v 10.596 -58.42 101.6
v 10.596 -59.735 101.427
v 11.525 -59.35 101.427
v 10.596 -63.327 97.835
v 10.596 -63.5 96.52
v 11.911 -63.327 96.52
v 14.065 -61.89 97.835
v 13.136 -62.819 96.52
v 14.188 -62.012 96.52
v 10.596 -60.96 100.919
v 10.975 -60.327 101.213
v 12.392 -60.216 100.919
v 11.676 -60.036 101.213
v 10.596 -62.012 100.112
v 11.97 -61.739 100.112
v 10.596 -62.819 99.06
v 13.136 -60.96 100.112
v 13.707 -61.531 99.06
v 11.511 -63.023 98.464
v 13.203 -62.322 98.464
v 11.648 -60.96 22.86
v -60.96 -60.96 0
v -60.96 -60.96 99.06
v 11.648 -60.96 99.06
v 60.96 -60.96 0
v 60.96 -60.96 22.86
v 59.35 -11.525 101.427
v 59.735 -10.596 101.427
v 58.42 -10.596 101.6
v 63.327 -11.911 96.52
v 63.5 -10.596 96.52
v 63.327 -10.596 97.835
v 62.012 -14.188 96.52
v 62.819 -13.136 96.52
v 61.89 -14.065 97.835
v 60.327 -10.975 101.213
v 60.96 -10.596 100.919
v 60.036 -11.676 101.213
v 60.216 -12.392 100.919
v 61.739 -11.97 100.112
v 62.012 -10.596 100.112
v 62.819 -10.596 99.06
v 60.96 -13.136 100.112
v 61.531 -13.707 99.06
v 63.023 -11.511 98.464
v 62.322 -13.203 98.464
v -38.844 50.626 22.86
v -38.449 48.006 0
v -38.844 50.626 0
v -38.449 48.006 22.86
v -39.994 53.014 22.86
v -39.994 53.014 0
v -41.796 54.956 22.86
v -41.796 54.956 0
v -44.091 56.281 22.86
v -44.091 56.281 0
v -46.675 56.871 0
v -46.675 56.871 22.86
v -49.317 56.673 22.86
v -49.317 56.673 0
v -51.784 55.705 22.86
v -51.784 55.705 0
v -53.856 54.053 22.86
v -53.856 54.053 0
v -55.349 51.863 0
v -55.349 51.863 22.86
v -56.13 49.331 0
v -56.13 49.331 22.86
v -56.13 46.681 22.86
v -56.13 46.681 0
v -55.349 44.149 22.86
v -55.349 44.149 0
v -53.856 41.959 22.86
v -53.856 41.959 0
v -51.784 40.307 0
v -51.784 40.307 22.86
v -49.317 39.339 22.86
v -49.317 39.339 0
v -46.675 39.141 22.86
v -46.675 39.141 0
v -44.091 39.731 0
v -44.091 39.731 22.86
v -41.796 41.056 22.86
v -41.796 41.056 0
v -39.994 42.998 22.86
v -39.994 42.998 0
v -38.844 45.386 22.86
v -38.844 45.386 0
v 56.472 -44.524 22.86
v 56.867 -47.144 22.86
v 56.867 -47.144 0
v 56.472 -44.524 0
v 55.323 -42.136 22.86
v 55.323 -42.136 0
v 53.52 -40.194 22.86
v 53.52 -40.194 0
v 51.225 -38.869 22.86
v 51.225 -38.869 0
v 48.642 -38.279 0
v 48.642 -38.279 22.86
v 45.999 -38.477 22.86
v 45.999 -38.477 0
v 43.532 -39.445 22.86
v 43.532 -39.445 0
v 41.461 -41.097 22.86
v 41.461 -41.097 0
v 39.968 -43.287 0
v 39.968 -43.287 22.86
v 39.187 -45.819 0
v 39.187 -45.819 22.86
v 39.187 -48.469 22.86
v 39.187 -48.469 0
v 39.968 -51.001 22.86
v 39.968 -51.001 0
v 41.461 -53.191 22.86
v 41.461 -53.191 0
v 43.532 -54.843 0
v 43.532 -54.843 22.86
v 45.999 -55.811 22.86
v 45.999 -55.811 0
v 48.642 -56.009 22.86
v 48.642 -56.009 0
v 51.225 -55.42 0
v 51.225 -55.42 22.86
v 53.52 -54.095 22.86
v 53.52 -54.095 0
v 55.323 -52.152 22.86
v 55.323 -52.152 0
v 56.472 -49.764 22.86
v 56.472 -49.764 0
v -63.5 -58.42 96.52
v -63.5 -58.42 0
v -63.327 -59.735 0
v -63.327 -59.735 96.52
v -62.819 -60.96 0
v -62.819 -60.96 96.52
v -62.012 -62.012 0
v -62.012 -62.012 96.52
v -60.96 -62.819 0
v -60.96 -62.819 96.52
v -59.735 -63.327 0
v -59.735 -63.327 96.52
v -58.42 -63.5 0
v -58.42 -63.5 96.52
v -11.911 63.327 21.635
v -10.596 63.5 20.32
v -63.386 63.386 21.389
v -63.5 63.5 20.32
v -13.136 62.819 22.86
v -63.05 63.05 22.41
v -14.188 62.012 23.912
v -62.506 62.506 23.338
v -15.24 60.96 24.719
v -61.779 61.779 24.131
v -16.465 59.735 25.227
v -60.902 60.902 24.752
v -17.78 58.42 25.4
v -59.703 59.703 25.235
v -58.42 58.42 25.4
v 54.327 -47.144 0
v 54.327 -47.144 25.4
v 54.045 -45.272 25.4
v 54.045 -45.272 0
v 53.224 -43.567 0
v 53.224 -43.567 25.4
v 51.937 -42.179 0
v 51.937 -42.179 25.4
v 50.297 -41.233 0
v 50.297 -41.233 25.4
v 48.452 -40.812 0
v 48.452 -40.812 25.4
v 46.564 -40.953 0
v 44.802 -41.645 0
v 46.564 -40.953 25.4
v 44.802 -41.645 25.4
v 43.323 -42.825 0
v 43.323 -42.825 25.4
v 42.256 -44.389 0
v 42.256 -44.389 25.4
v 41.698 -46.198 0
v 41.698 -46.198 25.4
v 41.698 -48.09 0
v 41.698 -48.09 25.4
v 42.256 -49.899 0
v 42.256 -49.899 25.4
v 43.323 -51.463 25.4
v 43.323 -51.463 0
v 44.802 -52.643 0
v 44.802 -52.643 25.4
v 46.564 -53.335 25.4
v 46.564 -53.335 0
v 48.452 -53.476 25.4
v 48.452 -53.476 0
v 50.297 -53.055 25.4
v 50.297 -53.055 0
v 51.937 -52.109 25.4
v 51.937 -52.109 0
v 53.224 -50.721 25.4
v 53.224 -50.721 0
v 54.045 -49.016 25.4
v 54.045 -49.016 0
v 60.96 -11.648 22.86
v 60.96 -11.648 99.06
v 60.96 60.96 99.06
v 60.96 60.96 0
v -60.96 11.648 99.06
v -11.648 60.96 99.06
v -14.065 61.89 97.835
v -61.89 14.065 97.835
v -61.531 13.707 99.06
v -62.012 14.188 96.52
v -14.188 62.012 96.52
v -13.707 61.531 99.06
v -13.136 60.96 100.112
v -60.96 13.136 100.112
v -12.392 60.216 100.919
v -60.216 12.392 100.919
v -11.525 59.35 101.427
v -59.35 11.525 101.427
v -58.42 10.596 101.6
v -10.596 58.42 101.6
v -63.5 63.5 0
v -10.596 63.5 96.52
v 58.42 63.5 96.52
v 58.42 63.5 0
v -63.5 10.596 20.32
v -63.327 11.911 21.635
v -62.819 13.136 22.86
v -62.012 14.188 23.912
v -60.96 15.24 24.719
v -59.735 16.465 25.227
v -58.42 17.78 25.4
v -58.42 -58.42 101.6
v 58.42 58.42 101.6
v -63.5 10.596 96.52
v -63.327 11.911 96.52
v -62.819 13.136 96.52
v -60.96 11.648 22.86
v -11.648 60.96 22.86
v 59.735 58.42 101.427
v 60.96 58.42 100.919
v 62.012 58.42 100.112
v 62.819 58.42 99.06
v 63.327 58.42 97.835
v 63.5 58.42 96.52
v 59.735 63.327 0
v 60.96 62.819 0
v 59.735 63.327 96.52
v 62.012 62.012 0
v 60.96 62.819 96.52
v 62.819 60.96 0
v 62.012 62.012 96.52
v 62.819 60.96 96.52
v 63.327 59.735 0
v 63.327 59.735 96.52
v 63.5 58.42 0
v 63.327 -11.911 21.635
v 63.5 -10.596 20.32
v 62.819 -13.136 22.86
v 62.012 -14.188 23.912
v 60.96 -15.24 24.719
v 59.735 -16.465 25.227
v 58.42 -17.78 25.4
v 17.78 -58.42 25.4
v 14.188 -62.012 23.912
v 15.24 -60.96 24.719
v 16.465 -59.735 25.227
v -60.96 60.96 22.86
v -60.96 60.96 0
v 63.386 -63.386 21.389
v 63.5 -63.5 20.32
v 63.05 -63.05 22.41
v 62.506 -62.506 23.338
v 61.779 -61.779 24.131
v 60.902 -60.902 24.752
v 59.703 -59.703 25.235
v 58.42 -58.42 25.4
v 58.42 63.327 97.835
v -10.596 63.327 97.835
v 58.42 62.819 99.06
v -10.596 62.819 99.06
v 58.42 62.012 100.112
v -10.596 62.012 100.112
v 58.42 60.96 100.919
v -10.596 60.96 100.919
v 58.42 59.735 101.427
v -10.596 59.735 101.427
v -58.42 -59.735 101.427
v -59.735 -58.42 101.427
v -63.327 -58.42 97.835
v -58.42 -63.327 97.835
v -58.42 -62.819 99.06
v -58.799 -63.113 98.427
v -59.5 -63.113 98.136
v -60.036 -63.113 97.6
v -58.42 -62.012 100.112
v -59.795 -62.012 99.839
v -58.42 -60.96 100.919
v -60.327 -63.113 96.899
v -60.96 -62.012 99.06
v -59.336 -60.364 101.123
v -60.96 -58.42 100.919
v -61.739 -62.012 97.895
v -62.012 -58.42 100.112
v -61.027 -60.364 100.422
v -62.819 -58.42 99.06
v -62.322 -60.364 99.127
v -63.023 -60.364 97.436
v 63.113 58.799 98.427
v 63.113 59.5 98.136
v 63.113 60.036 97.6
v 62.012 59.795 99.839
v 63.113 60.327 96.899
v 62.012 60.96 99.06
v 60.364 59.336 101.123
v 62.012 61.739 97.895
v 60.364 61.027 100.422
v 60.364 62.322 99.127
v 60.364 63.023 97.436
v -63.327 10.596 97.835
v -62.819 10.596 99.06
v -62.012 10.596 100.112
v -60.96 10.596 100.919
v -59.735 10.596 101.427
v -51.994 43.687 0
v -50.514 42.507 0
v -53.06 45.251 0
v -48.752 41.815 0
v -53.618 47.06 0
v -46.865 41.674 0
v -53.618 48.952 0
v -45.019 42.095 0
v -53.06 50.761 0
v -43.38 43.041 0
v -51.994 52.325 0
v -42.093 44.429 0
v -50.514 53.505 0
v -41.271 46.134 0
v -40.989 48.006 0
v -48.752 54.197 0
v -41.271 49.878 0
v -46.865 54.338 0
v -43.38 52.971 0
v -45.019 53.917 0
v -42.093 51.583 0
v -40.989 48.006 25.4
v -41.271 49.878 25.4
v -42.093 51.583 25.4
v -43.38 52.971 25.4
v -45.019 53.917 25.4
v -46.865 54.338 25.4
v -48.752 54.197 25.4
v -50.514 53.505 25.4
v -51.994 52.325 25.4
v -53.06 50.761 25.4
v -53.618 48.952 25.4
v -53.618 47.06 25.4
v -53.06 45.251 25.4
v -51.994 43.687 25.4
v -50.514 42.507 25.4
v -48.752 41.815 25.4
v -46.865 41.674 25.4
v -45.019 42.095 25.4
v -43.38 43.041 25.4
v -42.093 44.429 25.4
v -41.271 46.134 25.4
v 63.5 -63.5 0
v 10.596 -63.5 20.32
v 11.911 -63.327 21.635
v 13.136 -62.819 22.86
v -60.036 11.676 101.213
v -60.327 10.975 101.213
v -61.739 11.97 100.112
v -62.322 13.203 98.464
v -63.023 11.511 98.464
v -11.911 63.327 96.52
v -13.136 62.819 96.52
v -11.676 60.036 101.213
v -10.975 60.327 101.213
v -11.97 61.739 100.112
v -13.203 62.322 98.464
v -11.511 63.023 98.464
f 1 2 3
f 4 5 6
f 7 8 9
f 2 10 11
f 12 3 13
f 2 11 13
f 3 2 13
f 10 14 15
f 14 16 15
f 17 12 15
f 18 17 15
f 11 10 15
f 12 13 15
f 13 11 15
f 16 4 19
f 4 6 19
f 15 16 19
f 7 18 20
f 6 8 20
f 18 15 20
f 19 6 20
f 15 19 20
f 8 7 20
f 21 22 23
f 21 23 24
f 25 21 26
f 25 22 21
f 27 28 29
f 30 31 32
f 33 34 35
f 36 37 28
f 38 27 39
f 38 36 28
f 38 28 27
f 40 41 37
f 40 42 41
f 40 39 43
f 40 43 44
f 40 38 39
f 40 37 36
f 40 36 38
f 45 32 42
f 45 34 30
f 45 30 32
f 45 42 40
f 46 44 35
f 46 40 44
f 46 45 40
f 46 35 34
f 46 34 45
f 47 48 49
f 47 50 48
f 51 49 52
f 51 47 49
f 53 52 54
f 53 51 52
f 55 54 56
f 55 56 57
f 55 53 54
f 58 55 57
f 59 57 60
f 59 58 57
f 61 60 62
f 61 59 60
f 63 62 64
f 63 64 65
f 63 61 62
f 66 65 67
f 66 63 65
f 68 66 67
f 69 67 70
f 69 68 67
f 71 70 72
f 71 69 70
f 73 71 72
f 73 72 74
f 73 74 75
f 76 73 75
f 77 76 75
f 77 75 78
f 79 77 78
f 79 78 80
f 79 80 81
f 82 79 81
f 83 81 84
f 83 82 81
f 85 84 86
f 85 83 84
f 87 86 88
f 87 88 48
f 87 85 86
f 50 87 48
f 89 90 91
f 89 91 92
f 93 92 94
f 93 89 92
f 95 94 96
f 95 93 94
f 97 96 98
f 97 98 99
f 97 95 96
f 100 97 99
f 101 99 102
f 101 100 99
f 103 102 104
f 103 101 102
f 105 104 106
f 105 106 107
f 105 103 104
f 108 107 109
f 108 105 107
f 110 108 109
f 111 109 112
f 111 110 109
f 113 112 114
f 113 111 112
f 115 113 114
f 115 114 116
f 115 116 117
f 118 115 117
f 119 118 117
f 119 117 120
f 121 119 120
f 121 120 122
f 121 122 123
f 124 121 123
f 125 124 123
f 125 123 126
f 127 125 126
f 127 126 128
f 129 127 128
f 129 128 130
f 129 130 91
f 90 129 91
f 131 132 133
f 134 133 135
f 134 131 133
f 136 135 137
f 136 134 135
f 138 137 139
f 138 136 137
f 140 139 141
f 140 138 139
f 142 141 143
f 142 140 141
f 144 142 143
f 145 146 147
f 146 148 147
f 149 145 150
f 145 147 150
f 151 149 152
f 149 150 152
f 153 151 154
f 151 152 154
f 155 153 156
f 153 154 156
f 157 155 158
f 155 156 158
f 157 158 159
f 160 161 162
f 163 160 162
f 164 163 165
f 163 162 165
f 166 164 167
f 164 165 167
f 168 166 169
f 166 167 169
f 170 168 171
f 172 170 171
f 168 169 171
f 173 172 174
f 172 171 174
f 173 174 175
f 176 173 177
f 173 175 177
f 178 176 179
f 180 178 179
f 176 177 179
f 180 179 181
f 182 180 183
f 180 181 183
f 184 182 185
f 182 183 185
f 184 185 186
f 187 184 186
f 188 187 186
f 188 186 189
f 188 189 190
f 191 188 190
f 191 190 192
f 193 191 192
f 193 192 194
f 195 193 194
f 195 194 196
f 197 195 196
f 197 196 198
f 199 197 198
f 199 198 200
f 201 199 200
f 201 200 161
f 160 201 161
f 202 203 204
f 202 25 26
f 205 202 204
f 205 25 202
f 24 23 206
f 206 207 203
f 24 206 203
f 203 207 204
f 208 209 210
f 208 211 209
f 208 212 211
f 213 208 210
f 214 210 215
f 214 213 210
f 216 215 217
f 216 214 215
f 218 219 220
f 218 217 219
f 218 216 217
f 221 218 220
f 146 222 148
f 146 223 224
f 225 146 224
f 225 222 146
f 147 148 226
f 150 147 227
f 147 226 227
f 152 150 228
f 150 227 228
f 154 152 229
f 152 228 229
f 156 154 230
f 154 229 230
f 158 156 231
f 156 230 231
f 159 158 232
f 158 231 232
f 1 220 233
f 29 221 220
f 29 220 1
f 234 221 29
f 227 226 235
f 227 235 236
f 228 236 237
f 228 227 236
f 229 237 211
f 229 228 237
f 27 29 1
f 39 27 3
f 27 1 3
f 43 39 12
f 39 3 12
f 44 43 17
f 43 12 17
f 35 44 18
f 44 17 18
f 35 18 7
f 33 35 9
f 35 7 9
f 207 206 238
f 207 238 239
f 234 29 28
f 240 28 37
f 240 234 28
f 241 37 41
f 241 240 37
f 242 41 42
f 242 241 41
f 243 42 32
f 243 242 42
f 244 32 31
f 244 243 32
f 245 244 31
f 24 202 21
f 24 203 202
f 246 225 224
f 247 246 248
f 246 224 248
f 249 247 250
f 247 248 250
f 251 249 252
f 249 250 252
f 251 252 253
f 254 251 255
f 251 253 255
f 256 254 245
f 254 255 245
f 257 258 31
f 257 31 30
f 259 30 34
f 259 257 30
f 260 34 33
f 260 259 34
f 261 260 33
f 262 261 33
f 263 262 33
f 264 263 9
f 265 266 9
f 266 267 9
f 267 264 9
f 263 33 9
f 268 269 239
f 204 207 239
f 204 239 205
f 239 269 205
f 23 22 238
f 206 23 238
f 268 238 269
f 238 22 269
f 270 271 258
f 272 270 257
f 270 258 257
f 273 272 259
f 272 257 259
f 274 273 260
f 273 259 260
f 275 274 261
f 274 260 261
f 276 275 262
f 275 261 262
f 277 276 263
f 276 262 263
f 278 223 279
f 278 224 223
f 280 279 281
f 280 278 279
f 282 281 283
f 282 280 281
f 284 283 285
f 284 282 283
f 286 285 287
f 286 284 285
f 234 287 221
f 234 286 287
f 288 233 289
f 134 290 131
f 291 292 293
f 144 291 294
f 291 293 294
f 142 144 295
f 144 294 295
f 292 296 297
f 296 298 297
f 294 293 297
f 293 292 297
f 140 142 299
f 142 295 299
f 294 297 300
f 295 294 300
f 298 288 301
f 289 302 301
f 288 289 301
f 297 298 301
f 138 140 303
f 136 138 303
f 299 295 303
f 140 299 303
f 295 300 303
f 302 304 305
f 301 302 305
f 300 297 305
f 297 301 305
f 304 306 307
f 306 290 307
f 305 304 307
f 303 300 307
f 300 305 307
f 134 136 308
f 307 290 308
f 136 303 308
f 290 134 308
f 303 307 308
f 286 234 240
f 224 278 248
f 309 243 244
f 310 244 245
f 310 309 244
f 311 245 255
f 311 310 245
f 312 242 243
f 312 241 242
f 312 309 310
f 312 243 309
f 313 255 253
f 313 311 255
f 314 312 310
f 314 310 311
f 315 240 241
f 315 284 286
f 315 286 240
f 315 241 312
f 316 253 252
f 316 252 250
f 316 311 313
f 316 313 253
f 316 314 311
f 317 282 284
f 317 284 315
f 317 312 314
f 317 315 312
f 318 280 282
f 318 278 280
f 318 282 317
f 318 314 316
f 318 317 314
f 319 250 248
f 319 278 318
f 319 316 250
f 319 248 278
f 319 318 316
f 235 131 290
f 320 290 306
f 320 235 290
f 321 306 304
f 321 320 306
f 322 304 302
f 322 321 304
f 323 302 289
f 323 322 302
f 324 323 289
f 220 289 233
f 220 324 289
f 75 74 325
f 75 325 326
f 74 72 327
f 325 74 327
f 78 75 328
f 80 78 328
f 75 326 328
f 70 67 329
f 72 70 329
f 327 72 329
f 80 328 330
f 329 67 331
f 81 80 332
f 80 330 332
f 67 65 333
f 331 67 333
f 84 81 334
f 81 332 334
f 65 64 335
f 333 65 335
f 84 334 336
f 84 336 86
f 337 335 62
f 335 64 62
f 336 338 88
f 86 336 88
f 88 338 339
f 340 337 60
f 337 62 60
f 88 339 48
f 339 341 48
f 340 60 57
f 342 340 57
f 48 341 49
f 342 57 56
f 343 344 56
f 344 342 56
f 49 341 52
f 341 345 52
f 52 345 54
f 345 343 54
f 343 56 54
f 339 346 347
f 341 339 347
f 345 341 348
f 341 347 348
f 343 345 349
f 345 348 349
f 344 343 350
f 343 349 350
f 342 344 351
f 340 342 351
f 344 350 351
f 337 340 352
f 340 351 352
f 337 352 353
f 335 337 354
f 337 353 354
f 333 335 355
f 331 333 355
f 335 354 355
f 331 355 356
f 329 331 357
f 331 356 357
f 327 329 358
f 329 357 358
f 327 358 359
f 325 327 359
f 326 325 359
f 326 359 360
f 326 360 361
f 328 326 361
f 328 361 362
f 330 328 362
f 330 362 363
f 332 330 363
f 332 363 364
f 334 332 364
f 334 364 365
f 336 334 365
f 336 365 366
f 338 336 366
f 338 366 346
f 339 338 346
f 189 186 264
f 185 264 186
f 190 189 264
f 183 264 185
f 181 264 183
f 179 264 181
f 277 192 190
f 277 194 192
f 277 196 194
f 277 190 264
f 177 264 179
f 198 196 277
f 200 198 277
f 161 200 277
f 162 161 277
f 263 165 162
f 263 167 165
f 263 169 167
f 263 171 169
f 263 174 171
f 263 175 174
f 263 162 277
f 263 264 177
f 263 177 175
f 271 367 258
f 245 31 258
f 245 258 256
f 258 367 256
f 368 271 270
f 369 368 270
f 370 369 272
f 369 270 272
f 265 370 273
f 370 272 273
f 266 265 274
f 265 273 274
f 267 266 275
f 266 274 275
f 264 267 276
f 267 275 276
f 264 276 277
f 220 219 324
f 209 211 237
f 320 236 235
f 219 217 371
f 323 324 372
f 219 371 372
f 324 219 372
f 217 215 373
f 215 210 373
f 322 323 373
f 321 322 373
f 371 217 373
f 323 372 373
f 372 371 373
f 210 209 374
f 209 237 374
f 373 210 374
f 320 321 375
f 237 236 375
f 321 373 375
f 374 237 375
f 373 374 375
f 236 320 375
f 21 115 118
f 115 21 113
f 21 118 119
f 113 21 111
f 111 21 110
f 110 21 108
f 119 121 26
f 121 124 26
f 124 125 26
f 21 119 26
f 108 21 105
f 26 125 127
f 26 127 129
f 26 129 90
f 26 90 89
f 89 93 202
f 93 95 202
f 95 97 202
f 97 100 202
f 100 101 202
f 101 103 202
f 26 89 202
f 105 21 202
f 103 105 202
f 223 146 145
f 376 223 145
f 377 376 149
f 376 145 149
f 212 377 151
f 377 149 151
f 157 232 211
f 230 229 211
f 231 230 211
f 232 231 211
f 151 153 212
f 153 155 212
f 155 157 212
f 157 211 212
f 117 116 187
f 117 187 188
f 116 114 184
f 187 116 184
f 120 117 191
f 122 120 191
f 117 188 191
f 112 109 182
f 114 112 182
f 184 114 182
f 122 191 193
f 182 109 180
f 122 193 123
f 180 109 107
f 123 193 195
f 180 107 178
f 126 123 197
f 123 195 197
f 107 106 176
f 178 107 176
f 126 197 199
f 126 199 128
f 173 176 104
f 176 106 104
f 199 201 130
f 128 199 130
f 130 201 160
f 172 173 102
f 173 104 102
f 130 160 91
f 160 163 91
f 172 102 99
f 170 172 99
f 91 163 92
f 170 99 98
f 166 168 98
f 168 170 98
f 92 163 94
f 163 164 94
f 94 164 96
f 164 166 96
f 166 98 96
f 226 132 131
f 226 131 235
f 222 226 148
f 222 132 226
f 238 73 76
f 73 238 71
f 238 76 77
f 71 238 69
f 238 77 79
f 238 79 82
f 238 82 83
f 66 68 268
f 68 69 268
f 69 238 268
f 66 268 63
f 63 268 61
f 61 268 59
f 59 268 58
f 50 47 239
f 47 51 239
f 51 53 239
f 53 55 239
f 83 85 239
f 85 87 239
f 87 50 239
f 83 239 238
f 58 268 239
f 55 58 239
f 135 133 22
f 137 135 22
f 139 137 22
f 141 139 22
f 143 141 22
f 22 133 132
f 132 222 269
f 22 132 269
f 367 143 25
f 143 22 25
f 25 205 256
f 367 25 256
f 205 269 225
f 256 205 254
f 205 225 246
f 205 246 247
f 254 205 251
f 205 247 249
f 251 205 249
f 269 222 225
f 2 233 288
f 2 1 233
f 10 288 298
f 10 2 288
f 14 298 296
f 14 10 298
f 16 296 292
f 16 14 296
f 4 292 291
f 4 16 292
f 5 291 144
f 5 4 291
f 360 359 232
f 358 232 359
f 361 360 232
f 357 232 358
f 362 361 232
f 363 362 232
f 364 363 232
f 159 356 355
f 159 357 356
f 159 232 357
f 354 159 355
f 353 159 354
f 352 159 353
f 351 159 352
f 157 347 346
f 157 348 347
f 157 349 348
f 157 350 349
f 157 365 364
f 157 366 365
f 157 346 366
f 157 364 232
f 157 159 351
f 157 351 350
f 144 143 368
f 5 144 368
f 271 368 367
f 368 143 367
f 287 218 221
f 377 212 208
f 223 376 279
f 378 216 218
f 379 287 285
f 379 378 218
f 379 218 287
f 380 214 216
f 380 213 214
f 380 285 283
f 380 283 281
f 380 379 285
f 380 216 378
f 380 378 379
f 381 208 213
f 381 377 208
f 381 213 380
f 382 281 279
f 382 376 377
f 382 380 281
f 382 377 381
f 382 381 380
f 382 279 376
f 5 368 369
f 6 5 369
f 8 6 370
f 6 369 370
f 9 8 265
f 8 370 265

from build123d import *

# Parameters (mm, degrees)
F0_W     = 127
F0_H     = 127
F1_DEPTH = 101.6
F3_DEPTH = 76.2
F4_R     = 6.35
F5_DEPTH = 203.2
F6_T     = -2.54
F7_R     = 5.08


with BuildPart() as f1:
    # F0 (on Top) → F1 (new body)
    with BuildSketch(Plane.XY):
        Rectangle(F0_W, F0_H)
    extrude(amount=F1_DEPTH)

    # F2 (on face) → F3 (cut)
    with BuildSketch(Plane.XY.offset(101.6)):
        Polygon((63.5, -63.5), (63.5, -12.7), (12.7, -63.5), align=None)
        Polygon((-63.5, 12.7), (-12.7, 63.5), (-63.5, 63.5), align=None)
    extrude(amount=-F3_DEPTH, mode=Mode.SUBTRACT)

    # F4 (on face) → F5 (cut)
    with BuildSketch(Plane.XY.offset(25.4)):
        with Locations((-47.3392494023, 48.0060018599)):
            Circle(F4_R)
        with Locations((47.9774476191, -47.1440458012)):
            Circle(F4_R)
    extrude(amount=-F5_DEPTH, mode=Mode.SUBTRACT)

    # F6
    f6_openings = [f1.faces().sort_by_distance(p)[0] for p in [
        (-0.005092, -0.006878, 0),
    ]]
    offset(amount=F6_T, openings=f6_openings, kind=Kind.INTERSECTION)

    # F7
    f7_edges = [f1.edges().sort_by_distance(p)[0] for p in [
        (-38.1, 38.1, 101.6),
        (-63.5, -25.4, 101.6),
        (-63.5, 12.7, 63.5),
        (25.4, 63.5, 101.6),
        (63.5, 25.4, 101.6),
        (38.1, -38.1, 101.6),
        (63.5, -12.7, 63.5),
        (12.7, -63.5, 63.5),
        (-25.4, -63.5, 101.6),
        (63.5, -38.1, 25.4),
        (38.1, -63.5, 25.4),
        (63.5, 63.5, 50.8),
        (-12.7, 63.5, 63.5),
        (-38.1, 63.5, 25.4),
        (-63.5, 38.1, 25.4),
        (-63.5, -63.5, 50.8),
    ]]
    fillet(f7_edges, radius=F7_R)


solid = f1.part
